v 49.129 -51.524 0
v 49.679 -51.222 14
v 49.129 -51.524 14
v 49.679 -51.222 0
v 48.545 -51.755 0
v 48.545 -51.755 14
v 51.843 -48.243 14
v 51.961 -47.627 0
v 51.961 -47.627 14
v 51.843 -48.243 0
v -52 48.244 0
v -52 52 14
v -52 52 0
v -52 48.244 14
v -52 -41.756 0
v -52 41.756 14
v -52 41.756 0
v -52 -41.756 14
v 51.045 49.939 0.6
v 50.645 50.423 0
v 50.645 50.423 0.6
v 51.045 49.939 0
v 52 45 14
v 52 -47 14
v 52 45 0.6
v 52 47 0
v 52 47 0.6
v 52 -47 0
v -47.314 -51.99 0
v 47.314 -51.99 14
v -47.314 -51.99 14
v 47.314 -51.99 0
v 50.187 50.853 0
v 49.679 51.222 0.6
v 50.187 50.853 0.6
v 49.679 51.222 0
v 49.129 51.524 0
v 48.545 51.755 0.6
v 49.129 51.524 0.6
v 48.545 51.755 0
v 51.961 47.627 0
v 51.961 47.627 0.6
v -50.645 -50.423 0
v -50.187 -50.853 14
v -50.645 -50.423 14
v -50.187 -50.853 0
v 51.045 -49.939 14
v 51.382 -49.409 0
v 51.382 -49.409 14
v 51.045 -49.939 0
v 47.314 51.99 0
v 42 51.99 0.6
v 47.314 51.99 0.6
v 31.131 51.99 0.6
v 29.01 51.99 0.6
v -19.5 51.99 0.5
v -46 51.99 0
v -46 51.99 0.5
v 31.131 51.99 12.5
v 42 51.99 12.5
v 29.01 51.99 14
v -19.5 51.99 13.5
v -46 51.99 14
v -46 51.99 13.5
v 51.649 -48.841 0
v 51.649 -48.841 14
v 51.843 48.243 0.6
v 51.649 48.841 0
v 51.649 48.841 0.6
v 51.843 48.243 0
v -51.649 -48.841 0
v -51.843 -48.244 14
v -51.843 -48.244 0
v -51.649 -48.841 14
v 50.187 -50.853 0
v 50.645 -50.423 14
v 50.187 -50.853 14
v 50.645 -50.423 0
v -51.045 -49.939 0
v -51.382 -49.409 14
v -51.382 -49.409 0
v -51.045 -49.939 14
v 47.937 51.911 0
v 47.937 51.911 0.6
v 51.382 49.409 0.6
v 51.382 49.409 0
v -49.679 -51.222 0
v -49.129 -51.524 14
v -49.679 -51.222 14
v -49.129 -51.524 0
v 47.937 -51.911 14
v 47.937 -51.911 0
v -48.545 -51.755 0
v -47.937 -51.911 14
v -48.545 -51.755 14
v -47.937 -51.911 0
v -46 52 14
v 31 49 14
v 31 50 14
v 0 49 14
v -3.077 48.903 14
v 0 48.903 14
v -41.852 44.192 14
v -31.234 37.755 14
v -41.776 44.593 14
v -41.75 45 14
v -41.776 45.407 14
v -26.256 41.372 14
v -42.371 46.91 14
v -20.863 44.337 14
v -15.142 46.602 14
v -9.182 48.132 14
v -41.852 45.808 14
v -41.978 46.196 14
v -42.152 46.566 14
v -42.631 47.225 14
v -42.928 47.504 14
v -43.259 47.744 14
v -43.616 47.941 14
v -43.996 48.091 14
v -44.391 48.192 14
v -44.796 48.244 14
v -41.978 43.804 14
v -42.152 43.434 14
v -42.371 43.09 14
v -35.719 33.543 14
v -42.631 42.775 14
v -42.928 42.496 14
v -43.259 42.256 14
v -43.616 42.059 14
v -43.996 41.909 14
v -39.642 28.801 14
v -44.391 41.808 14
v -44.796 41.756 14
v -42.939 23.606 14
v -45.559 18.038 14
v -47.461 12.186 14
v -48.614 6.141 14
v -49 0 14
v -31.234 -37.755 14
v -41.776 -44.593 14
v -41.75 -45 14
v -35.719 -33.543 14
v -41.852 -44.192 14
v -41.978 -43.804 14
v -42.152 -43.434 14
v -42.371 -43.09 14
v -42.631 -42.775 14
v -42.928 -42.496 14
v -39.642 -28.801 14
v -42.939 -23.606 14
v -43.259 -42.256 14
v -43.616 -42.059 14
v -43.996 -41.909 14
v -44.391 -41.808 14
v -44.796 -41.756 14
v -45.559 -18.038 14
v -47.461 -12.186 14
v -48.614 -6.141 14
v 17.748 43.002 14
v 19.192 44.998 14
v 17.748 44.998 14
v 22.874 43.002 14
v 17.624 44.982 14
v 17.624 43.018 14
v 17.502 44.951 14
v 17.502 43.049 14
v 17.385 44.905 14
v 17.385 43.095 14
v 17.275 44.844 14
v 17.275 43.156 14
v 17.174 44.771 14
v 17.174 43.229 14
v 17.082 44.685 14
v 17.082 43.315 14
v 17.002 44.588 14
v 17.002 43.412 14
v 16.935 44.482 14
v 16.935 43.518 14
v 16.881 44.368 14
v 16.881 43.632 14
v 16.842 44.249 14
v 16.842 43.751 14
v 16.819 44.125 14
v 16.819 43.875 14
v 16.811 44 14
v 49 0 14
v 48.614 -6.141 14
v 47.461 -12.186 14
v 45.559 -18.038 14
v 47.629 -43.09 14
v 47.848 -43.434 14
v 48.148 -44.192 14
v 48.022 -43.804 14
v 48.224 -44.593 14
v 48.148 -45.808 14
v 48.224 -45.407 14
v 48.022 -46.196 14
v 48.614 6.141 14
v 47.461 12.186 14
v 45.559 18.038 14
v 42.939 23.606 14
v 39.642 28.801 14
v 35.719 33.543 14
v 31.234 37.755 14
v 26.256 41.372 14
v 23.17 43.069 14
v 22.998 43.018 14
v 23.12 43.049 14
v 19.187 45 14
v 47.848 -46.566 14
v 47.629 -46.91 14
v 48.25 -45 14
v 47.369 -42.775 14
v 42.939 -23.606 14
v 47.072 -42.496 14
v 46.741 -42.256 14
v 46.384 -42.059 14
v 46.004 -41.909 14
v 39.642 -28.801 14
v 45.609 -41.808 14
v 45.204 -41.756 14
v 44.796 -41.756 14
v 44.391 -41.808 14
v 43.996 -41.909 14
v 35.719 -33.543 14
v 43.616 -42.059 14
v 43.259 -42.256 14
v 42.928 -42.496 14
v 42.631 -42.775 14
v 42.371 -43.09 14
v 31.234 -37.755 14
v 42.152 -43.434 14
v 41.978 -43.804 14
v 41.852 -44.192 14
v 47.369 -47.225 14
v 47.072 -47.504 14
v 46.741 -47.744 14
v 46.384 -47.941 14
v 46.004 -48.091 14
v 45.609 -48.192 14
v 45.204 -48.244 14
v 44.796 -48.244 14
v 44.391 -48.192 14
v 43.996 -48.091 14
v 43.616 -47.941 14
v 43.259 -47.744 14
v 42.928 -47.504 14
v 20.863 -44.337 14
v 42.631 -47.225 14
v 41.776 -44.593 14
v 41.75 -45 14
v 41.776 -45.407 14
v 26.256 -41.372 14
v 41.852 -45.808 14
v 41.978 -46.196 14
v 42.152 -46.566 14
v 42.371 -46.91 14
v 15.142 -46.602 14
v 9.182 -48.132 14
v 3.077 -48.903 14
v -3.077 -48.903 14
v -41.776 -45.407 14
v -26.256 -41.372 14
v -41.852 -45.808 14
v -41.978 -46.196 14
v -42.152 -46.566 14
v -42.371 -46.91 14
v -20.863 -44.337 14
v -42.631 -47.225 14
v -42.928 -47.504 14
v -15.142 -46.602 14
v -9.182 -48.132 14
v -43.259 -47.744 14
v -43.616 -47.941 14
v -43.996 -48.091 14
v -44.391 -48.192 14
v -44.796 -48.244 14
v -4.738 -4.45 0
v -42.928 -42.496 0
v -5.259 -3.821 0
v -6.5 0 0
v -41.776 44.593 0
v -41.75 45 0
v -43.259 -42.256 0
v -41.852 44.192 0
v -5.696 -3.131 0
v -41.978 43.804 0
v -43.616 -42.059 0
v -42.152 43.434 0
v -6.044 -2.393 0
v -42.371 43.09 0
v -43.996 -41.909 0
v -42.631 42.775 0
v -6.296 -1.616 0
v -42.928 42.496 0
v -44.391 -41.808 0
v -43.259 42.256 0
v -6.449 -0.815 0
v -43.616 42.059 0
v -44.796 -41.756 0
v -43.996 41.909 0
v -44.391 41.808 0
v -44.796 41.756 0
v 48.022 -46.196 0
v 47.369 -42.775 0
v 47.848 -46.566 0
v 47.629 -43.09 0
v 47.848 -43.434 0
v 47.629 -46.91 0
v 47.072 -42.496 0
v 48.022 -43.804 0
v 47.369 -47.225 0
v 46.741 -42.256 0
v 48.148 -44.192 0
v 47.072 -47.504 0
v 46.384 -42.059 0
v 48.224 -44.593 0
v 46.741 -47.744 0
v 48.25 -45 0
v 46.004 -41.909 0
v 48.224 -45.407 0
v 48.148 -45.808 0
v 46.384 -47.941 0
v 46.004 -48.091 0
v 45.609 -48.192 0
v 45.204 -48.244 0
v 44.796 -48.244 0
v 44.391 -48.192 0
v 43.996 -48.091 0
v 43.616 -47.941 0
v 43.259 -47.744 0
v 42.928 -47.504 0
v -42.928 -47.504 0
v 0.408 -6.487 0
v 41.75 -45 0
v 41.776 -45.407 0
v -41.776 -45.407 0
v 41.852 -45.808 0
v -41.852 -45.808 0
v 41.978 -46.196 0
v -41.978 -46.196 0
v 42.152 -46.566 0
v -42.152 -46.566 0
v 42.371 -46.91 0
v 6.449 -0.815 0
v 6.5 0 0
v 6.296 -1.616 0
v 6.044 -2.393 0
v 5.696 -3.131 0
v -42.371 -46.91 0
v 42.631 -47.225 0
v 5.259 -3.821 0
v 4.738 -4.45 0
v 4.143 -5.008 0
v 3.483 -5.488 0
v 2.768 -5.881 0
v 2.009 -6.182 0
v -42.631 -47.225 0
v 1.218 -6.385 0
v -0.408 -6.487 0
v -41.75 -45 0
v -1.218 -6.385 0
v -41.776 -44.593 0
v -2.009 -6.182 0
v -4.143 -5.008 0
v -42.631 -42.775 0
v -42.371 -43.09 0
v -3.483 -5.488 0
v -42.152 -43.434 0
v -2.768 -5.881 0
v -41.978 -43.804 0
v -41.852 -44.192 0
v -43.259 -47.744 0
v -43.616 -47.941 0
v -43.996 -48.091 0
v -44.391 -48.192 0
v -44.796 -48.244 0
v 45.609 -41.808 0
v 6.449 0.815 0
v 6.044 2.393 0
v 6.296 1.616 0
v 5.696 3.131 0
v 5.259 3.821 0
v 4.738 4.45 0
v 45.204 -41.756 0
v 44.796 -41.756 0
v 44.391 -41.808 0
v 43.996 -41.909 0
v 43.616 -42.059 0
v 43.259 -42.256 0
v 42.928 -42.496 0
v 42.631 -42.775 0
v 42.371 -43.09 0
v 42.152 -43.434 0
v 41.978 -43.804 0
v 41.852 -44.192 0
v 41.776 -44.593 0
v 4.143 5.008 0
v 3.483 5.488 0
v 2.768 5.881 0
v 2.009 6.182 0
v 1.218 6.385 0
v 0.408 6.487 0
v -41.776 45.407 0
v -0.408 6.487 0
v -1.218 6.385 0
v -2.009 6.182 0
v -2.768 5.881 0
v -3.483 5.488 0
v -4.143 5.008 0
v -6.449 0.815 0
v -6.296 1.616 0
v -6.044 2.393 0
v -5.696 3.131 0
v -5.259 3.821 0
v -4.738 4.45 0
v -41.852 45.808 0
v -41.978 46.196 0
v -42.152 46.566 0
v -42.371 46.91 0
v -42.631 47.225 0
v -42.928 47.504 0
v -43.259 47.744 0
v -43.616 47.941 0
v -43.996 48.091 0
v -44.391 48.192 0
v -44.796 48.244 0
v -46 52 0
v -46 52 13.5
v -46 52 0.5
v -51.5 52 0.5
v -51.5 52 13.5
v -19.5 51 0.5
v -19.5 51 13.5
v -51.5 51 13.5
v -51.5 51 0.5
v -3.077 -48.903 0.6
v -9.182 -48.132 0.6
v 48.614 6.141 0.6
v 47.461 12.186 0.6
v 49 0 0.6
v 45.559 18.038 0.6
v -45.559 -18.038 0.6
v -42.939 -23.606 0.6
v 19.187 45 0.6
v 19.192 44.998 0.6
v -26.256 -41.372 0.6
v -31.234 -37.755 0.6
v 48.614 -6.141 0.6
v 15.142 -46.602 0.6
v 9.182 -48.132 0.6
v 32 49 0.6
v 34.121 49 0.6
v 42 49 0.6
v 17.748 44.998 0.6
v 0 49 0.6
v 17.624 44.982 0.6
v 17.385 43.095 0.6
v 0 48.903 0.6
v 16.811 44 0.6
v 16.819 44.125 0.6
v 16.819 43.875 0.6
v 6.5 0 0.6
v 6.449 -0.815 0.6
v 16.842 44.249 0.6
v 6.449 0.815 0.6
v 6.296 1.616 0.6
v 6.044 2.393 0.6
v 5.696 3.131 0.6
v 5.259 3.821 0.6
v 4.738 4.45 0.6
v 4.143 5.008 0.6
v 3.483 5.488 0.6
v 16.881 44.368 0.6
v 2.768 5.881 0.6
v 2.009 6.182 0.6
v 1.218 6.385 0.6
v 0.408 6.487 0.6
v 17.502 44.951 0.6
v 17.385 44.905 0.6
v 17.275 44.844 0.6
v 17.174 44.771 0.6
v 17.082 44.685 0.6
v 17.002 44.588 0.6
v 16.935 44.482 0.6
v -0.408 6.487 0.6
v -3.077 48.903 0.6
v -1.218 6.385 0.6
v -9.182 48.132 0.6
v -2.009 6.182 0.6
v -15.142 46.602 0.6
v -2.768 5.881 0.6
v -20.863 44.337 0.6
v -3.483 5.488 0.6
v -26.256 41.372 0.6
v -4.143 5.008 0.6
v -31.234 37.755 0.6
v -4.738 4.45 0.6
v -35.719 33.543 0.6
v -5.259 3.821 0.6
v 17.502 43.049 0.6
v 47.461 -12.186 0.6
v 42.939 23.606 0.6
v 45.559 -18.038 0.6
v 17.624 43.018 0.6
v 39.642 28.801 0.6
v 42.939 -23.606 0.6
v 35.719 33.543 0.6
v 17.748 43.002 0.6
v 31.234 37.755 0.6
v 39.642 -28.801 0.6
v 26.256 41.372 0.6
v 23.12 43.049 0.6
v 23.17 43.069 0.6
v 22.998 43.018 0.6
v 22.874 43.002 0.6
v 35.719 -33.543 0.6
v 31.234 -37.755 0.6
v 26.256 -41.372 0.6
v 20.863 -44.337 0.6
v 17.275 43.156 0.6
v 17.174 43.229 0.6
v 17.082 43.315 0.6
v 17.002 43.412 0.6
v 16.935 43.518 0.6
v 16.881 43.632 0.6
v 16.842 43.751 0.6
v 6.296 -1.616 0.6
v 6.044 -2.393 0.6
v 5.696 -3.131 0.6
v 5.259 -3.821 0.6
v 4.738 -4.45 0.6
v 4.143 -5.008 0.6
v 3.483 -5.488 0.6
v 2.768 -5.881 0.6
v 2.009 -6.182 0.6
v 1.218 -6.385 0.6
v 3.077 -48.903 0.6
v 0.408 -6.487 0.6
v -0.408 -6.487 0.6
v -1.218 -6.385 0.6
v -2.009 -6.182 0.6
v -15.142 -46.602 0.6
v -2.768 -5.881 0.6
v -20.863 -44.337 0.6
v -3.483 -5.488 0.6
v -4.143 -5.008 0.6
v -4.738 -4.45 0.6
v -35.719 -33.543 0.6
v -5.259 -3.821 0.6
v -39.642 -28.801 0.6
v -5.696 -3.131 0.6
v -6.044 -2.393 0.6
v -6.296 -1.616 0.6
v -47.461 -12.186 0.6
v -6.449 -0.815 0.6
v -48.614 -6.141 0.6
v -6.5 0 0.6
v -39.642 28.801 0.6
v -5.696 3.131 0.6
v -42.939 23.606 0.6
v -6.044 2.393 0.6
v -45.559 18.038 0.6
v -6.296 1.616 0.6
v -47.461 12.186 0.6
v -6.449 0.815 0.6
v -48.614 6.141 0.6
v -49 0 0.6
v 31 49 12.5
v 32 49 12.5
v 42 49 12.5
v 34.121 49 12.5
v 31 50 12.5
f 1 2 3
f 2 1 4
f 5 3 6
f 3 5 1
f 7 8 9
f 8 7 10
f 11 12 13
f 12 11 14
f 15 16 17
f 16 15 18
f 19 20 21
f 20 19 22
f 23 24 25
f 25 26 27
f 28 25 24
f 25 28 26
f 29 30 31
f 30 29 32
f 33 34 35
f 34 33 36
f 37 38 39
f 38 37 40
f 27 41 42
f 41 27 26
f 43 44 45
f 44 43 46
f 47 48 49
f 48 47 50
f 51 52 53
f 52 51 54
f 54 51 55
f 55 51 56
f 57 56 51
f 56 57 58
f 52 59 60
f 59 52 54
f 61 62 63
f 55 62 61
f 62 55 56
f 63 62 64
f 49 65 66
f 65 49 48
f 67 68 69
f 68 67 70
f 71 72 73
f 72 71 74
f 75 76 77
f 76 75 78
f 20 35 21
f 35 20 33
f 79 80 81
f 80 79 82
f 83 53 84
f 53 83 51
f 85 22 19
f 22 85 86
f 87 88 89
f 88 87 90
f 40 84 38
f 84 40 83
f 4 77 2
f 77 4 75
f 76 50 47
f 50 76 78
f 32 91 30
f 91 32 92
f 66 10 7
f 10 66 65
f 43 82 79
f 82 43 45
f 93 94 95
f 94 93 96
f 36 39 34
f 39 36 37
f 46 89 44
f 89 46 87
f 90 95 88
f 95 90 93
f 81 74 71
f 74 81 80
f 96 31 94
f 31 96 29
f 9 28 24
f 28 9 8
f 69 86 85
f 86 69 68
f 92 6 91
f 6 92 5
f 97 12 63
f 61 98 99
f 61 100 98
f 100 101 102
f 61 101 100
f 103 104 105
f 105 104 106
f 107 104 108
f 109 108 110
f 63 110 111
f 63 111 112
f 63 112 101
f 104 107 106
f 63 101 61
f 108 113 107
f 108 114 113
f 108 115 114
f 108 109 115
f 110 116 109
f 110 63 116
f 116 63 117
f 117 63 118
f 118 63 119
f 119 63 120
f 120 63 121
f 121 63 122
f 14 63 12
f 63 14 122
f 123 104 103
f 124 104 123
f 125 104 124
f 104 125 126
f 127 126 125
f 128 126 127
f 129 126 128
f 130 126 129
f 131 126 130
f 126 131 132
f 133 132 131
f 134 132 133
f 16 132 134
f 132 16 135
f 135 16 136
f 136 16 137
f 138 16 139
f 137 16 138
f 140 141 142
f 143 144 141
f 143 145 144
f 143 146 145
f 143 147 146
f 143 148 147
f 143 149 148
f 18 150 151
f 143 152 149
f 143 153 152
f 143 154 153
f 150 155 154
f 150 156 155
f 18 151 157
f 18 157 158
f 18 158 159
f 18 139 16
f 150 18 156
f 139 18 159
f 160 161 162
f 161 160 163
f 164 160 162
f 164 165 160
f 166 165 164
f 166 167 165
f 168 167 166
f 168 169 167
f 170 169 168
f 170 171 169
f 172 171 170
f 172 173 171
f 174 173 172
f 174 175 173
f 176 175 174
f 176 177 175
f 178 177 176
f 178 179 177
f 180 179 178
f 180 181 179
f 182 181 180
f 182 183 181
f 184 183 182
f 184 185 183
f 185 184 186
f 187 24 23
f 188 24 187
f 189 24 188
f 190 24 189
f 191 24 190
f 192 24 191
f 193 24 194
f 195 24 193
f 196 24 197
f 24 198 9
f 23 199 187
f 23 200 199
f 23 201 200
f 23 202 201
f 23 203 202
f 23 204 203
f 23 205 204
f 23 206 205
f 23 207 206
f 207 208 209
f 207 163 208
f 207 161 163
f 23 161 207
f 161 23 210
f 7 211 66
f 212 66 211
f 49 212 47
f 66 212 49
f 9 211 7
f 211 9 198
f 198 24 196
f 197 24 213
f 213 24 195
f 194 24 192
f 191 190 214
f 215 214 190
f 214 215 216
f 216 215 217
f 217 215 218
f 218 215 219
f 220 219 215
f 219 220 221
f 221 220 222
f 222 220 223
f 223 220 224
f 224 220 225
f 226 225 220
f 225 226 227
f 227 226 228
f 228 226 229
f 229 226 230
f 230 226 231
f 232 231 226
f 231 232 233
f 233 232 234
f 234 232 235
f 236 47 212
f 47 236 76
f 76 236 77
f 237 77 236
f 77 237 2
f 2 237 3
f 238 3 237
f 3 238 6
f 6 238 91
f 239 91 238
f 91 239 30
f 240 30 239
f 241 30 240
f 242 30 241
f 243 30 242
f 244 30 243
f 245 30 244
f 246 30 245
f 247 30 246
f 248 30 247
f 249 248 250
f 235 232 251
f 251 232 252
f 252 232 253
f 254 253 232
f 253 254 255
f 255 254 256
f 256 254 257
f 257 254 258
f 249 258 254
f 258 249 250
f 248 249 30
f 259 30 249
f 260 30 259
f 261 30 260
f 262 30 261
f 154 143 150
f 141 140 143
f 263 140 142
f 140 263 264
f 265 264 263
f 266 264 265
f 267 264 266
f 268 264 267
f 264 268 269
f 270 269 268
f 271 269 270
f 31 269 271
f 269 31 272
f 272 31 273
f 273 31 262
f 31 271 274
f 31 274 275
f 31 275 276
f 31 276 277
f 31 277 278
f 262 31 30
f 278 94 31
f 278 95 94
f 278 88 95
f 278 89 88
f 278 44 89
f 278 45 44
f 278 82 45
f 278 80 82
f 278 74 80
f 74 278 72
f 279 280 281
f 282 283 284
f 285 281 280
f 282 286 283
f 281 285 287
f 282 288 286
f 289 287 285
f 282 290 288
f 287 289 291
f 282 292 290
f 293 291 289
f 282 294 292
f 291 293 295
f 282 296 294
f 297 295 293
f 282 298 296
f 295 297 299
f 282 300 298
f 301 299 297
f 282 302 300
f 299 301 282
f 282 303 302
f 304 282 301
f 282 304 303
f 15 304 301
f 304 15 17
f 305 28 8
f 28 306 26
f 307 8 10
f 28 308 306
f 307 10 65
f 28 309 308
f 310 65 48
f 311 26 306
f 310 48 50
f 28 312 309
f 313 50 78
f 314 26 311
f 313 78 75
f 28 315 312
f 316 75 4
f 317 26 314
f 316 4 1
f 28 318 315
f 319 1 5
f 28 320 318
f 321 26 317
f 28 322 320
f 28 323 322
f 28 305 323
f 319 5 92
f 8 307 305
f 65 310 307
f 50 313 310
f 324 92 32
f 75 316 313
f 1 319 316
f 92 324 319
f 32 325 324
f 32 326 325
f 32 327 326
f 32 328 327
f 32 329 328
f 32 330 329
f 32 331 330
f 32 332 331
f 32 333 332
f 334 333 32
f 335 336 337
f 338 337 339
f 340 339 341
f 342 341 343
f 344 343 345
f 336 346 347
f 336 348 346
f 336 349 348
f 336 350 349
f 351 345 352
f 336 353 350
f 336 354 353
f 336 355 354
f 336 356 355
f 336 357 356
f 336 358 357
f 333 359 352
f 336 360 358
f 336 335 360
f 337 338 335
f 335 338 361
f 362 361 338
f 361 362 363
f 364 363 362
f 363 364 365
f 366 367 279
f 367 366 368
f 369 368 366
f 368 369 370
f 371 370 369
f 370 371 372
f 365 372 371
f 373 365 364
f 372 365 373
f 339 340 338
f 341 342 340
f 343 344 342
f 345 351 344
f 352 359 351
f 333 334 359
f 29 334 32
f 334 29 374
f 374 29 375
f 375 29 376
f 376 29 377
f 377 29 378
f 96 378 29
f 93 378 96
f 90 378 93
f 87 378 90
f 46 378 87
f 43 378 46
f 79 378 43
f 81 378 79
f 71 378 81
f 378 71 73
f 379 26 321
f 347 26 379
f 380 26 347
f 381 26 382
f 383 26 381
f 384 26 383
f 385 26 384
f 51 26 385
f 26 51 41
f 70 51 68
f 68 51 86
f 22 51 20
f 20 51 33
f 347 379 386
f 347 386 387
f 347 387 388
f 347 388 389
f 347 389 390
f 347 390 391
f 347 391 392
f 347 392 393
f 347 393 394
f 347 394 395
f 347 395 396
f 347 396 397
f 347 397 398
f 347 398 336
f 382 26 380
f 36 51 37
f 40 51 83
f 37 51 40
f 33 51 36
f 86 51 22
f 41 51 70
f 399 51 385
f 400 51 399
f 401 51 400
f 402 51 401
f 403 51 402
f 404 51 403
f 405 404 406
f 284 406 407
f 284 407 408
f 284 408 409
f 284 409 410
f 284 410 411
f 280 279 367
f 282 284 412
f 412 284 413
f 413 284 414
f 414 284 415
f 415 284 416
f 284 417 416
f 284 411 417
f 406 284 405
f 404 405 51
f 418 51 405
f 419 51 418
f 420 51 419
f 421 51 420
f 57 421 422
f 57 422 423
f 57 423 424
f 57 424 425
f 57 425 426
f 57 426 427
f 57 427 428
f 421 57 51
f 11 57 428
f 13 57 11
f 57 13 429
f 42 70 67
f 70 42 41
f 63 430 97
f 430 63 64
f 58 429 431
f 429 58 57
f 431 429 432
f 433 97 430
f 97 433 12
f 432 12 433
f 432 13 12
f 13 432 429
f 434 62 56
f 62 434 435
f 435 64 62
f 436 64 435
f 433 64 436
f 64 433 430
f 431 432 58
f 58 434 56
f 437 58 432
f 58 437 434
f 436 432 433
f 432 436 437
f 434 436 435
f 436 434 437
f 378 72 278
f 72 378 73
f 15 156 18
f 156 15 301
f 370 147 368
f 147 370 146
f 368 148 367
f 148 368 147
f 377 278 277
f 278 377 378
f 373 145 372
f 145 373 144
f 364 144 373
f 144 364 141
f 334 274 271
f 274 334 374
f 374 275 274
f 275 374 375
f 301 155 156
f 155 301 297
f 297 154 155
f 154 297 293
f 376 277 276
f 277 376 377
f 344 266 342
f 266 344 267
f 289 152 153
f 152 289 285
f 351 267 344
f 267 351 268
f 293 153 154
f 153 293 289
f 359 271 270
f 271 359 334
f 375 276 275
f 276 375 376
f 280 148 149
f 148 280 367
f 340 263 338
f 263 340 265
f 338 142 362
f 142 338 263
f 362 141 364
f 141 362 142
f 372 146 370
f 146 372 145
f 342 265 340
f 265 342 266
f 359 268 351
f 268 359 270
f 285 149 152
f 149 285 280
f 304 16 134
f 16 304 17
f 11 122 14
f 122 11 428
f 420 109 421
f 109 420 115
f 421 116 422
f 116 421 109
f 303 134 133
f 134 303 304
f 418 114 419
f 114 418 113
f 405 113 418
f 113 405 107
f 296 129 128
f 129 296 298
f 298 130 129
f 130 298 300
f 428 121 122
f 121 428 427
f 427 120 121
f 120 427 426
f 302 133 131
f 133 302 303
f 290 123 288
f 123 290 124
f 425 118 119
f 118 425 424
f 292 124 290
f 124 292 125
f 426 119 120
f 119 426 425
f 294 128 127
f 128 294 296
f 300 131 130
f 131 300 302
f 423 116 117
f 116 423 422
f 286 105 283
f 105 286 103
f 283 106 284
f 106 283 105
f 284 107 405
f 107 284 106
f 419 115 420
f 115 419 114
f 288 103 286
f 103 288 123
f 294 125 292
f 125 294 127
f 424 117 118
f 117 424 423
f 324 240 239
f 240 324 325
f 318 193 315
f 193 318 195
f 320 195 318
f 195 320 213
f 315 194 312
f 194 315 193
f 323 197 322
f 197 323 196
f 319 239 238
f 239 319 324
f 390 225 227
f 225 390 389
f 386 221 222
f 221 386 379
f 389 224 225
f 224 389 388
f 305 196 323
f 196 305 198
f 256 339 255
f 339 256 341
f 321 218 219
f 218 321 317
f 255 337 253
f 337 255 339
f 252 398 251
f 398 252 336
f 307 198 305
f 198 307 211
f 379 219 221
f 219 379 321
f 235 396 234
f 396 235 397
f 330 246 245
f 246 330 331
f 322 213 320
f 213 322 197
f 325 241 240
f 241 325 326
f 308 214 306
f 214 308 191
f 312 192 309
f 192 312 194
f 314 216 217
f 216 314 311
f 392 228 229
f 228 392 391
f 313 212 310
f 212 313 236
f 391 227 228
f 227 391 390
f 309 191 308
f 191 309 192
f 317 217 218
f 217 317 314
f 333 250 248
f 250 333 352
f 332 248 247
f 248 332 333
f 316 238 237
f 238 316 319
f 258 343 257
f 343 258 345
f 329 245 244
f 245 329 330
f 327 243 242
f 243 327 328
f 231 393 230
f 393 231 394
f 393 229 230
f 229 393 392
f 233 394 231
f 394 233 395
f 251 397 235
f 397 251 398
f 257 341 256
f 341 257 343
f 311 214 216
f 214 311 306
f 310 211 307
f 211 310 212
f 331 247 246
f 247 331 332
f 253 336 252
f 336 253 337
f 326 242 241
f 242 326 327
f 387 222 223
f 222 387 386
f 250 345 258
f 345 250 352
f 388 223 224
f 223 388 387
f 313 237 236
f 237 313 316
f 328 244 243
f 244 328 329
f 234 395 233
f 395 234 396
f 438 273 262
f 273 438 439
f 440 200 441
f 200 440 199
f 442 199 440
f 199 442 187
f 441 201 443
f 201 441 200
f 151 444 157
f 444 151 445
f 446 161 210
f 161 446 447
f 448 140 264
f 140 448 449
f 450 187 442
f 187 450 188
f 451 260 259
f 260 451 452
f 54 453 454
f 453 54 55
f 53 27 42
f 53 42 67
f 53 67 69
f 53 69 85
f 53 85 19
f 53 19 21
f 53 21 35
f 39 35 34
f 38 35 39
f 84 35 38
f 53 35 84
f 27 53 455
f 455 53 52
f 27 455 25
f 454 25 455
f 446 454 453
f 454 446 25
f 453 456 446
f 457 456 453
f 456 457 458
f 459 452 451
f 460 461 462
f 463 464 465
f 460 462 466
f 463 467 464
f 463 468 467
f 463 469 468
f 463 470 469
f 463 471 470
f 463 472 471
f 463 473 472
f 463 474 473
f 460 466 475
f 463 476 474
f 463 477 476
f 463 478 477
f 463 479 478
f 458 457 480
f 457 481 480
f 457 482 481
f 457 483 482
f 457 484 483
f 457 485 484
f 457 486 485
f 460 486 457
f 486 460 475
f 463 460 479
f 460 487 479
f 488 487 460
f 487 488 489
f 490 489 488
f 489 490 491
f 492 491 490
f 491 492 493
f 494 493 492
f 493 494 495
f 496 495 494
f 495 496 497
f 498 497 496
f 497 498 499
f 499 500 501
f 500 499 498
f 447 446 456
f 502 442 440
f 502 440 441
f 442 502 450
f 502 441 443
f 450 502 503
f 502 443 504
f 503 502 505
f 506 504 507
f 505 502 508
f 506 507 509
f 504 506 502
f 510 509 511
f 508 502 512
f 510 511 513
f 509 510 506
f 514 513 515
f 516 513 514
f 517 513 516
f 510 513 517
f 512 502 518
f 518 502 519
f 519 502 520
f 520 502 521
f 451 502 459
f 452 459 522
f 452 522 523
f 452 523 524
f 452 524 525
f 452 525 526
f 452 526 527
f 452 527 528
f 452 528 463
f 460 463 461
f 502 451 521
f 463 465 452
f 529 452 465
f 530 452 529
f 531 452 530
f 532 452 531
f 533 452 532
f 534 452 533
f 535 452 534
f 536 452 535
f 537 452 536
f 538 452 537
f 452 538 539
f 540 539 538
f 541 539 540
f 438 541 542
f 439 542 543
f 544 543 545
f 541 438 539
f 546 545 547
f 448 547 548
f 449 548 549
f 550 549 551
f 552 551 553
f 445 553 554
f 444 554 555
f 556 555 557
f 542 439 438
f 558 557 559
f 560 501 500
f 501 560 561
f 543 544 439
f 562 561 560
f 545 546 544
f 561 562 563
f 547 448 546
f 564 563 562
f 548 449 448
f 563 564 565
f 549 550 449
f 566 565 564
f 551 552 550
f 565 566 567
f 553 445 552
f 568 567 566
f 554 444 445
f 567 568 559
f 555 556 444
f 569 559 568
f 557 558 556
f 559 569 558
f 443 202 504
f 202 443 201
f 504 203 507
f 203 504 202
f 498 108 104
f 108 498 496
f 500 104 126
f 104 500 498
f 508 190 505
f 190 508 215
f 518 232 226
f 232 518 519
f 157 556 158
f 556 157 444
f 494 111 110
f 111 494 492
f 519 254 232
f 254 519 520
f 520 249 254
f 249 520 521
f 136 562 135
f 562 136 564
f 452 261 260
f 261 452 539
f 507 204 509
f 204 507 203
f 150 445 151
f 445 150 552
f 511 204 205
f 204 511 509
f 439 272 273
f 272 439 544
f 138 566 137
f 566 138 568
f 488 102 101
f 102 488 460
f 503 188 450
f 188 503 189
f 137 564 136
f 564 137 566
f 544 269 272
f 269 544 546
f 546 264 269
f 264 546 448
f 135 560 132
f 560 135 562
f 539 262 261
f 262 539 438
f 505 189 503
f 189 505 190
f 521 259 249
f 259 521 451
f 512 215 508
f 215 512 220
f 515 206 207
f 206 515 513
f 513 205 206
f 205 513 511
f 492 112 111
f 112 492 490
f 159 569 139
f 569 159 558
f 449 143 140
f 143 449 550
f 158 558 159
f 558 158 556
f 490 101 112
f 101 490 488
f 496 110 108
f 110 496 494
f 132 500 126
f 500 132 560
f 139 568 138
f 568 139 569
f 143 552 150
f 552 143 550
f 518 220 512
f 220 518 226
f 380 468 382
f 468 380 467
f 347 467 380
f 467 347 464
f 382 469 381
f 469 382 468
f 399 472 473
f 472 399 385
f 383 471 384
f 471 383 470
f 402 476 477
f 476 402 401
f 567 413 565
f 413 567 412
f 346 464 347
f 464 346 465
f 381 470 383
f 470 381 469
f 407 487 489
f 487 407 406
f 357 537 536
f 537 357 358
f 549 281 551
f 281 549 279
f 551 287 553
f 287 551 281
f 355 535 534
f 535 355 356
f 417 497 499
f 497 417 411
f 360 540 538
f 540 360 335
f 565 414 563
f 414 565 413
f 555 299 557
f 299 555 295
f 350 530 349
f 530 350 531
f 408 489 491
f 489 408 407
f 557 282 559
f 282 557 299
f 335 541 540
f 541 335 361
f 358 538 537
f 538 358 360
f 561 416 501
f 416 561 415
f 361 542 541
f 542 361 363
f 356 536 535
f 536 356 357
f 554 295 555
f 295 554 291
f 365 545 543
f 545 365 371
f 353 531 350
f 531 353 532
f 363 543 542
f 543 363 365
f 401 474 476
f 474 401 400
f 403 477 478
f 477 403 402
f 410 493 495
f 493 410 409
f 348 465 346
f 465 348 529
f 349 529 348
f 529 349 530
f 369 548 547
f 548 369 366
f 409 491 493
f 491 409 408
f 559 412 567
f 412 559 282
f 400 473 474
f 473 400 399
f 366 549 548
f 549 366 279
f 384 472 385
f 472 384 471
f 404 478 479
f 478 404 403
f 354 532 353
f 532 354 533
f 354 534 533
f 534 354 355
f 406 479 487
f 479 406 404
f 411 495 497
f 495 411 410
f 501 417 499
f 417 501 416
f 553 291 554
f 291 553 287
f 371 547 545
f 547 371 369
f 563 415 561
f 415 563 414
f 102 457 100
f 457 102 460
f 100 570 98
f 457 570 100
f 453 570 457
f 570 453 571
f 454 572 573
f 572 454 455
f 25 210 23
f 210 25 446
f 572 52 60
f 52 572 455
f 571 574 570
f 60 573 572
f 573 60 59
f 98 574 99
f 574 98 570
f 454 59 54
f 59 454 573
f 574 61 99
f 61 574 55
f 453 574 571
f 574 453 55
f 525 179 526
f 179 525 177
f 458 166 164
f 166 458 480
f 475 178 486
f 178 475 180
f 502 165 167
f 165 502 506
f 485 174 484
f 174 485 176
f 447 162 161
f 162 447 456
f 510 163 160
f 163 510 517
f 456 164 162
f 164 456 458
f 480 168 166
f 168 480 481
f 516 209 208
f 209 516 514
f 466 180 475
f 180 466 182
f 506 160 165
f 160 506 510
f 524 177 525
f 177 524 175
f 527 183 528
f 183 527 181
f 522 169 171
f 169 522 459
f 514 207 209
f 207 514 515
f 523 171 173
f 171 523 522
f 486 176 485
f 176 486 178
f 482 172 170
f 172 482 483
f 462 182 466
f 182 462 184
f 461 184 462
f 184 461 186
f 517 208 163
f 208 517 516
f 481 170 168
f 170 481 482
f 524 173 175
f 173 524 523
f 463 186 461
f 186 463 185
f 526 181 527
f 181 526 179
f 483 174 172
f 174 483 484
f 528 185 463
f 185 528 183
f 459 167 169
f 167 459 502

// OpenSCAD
$fn = 50;


union() {
	difference() {
		union() {
			translate(v = [0, 0, 0]) {
				rotate(a = [0, 0, 0]) {
					hull() {
						translate(v = [-47.0000000000, 47.0000000000, 0]) {
							rotate(a = [0, 0, 0]) {
								translate(v = [0, 0, 0]) {
									rotate(a = [0, 0, 0]) {
										cylinder(h = 14, r = 5);
									}
								}
							}
						}
						translate(v = [47.0000000000, 47.0000000000, 0]) {
							rotate(a = [0, 0, 0]) {
								translate(v = [0, 0, 0]) {
									rotate(a = [0, 0, 0]) {
										cylinder(h = 14, r = 5);
									}
								}
							}
						}
						translate(v = [-47.0000000000, -47.0000000000, 0]) {
							rotate(a = [0, 0, 0]) {
								translate(v = [0, 0, 0]) {
									rotate(a = [0, 0, 0]) {
										cylinder(h = 14, r = 5);
									}
								}
							}
						}
						translate(v = [47.0000000000, -47.0000000000, 0]) {
							rotate(a = [0, 0, 0]) {
								translate(v = [0, 0, 0]) {
									rotate(a = [0, 0, 0]) {
										cylinder(h = 14, r = 5);
									}
								}
							}
						}
					}
				}
			}
			translate(v = [-52.0000000000, 46.0000000000, 0]) {
				rotate(a = [0, 0, 0]) {
					cube(size = [6, 6, 14]);
				}
			}
		}
		union() {
			#translate(v = [-51.5000000000, 51.0000000000, 0.5000000000]) {
				rotate(a = [0, 0, 0]) {
					cube(size = [32, 1, 13.0000000000]);
				}
			}
			translate(v = [-52.5000000000, -45.0000000000, -125]) {
				rotate(a = [0, 0, 0]) {
					hull() {
						translate(v = [7.5000000000, 0, 0]) {
							rotate(a = [0, 0, 0]) {
								translate(v = [0, 0, 0]) {
									rotate(a = [0, 0, 0]) {
										cylinder(h = 250, r = 3.2500000000);
									}
								}
							}
						}
						translate(v = [-7.5000000000, 0, 0]) {
							rotate(a = [0, 0, 0]) {
								translate(v = [0, 0, 0]) {
									rotate(a = [0, 0, 0]) {
										cylinder(h = 250, r = 3.2500000000);
									}
								}
							}
						}
					}
				}
			}
			translate(v = [-52.5000000000, 45.0000000000, -125]) {
				rotate(a = [0, 0, 0]) {
					hull() {
						translate(v = [7.5000000000, 0, 0]) {
							rotate(a = [0, 0, 0]) {
								translate(v = [0, 0, 0]) {
									rotate(a = [0, 0, 0]) {
										cylinder(h = 250, r = 3.2500000000);
									}
								}
							}
						}
						translate(v = [-7.5000000000, 0, 0]) {
							rotate(a = [0, 0, 0]) {
								translate(v = [0, 0, 0]) {
									rotate(a = [0, 0, 0]) {
										cylinder(h = 250, r = 3.2500000000);
									}
								}
							}
						}
					}
				}
			}
			translate(v = [45.0000000000, -45.0000000000, -125.0000000000]) {
				rotate(a = [0, 0, 0]) {
					cylinder(h = 250, r = 3.2500000000);
				}
			}
			translate(v = [0, 0, 0.6000000000]) {
				rotate(a = [0, 0, 0]) {
					cylinder(h = 16.4000000000, r = 49.0000000000);
				}
			}
			translate(v = [0, 0, -7.0000000000]) {
				rotate(a = [0, 0, 0]) {
					cylinder(h = 14, r = 6.5000000000);
				}
			}
			translate(v = [0.0000000000, 45.0000000000, 0.6000000000]) {
				rotate(a = [0, 0, 0]) {
					cube(size = [52.0000000000, 4, 16.4000000000]);
				}
			}
			translate(v = [42.0000000000, 45.0000000000, 0.6000000000]) {
				rotate(a = [0, 0, 0]) {
					cube(size = [10, 7, 16.4000000000]);
				}
			}
			translate(v = [31.0000000000, 45.0000000000, 12.5000000000]) {
				rotate(a = [0, 0, 0]) {
					cube(size = [21, 7, 1.5000000000]);
				}
			}
			translate(v = [28.2500000000, 52.7500000000, 0.6000000000]) {
				rotate(a = [0, 0, -45]) {
					cube(size = [7.5000000000, 1.5000000000, 16.4000000000]);
				}
			}
			translate(v = [11.0610000000, 43.0000000000, 0.6000000000]) {
				rotate(a = [0, 0, 0]) {
					cube(size = [7.5000000000, 2, 13.4000000000]);
				}
			}
		}
	}
	union() {
		translate(v = [20.3110000000, 44.0000000000, 0]) {
			rotate(a = [0, 0, 0]) {
				hull() {
					translate(v = [2.5000000000, 0, 0]) {
						rotate(a = [0, 0, 0]) {
							#translate(v = [0, 0, 0]) {
								rotate(a = [0, 0, 0]) {
									cylinder(h = 14, r = 1.0000000000);
								}
							}
						}
					}
					translate(v = [-2.5000000000, 0, 0]) {
						rotate(a = [0, 0, 0]) {
							#translate(v = [0, 0, 0]) {
								rotate(a = [0, 0, 0]) {
									cylinder(h = 14, r = 1.0000000000);
								}
							}
						}
					}
				}
			}
		}
	}
}
